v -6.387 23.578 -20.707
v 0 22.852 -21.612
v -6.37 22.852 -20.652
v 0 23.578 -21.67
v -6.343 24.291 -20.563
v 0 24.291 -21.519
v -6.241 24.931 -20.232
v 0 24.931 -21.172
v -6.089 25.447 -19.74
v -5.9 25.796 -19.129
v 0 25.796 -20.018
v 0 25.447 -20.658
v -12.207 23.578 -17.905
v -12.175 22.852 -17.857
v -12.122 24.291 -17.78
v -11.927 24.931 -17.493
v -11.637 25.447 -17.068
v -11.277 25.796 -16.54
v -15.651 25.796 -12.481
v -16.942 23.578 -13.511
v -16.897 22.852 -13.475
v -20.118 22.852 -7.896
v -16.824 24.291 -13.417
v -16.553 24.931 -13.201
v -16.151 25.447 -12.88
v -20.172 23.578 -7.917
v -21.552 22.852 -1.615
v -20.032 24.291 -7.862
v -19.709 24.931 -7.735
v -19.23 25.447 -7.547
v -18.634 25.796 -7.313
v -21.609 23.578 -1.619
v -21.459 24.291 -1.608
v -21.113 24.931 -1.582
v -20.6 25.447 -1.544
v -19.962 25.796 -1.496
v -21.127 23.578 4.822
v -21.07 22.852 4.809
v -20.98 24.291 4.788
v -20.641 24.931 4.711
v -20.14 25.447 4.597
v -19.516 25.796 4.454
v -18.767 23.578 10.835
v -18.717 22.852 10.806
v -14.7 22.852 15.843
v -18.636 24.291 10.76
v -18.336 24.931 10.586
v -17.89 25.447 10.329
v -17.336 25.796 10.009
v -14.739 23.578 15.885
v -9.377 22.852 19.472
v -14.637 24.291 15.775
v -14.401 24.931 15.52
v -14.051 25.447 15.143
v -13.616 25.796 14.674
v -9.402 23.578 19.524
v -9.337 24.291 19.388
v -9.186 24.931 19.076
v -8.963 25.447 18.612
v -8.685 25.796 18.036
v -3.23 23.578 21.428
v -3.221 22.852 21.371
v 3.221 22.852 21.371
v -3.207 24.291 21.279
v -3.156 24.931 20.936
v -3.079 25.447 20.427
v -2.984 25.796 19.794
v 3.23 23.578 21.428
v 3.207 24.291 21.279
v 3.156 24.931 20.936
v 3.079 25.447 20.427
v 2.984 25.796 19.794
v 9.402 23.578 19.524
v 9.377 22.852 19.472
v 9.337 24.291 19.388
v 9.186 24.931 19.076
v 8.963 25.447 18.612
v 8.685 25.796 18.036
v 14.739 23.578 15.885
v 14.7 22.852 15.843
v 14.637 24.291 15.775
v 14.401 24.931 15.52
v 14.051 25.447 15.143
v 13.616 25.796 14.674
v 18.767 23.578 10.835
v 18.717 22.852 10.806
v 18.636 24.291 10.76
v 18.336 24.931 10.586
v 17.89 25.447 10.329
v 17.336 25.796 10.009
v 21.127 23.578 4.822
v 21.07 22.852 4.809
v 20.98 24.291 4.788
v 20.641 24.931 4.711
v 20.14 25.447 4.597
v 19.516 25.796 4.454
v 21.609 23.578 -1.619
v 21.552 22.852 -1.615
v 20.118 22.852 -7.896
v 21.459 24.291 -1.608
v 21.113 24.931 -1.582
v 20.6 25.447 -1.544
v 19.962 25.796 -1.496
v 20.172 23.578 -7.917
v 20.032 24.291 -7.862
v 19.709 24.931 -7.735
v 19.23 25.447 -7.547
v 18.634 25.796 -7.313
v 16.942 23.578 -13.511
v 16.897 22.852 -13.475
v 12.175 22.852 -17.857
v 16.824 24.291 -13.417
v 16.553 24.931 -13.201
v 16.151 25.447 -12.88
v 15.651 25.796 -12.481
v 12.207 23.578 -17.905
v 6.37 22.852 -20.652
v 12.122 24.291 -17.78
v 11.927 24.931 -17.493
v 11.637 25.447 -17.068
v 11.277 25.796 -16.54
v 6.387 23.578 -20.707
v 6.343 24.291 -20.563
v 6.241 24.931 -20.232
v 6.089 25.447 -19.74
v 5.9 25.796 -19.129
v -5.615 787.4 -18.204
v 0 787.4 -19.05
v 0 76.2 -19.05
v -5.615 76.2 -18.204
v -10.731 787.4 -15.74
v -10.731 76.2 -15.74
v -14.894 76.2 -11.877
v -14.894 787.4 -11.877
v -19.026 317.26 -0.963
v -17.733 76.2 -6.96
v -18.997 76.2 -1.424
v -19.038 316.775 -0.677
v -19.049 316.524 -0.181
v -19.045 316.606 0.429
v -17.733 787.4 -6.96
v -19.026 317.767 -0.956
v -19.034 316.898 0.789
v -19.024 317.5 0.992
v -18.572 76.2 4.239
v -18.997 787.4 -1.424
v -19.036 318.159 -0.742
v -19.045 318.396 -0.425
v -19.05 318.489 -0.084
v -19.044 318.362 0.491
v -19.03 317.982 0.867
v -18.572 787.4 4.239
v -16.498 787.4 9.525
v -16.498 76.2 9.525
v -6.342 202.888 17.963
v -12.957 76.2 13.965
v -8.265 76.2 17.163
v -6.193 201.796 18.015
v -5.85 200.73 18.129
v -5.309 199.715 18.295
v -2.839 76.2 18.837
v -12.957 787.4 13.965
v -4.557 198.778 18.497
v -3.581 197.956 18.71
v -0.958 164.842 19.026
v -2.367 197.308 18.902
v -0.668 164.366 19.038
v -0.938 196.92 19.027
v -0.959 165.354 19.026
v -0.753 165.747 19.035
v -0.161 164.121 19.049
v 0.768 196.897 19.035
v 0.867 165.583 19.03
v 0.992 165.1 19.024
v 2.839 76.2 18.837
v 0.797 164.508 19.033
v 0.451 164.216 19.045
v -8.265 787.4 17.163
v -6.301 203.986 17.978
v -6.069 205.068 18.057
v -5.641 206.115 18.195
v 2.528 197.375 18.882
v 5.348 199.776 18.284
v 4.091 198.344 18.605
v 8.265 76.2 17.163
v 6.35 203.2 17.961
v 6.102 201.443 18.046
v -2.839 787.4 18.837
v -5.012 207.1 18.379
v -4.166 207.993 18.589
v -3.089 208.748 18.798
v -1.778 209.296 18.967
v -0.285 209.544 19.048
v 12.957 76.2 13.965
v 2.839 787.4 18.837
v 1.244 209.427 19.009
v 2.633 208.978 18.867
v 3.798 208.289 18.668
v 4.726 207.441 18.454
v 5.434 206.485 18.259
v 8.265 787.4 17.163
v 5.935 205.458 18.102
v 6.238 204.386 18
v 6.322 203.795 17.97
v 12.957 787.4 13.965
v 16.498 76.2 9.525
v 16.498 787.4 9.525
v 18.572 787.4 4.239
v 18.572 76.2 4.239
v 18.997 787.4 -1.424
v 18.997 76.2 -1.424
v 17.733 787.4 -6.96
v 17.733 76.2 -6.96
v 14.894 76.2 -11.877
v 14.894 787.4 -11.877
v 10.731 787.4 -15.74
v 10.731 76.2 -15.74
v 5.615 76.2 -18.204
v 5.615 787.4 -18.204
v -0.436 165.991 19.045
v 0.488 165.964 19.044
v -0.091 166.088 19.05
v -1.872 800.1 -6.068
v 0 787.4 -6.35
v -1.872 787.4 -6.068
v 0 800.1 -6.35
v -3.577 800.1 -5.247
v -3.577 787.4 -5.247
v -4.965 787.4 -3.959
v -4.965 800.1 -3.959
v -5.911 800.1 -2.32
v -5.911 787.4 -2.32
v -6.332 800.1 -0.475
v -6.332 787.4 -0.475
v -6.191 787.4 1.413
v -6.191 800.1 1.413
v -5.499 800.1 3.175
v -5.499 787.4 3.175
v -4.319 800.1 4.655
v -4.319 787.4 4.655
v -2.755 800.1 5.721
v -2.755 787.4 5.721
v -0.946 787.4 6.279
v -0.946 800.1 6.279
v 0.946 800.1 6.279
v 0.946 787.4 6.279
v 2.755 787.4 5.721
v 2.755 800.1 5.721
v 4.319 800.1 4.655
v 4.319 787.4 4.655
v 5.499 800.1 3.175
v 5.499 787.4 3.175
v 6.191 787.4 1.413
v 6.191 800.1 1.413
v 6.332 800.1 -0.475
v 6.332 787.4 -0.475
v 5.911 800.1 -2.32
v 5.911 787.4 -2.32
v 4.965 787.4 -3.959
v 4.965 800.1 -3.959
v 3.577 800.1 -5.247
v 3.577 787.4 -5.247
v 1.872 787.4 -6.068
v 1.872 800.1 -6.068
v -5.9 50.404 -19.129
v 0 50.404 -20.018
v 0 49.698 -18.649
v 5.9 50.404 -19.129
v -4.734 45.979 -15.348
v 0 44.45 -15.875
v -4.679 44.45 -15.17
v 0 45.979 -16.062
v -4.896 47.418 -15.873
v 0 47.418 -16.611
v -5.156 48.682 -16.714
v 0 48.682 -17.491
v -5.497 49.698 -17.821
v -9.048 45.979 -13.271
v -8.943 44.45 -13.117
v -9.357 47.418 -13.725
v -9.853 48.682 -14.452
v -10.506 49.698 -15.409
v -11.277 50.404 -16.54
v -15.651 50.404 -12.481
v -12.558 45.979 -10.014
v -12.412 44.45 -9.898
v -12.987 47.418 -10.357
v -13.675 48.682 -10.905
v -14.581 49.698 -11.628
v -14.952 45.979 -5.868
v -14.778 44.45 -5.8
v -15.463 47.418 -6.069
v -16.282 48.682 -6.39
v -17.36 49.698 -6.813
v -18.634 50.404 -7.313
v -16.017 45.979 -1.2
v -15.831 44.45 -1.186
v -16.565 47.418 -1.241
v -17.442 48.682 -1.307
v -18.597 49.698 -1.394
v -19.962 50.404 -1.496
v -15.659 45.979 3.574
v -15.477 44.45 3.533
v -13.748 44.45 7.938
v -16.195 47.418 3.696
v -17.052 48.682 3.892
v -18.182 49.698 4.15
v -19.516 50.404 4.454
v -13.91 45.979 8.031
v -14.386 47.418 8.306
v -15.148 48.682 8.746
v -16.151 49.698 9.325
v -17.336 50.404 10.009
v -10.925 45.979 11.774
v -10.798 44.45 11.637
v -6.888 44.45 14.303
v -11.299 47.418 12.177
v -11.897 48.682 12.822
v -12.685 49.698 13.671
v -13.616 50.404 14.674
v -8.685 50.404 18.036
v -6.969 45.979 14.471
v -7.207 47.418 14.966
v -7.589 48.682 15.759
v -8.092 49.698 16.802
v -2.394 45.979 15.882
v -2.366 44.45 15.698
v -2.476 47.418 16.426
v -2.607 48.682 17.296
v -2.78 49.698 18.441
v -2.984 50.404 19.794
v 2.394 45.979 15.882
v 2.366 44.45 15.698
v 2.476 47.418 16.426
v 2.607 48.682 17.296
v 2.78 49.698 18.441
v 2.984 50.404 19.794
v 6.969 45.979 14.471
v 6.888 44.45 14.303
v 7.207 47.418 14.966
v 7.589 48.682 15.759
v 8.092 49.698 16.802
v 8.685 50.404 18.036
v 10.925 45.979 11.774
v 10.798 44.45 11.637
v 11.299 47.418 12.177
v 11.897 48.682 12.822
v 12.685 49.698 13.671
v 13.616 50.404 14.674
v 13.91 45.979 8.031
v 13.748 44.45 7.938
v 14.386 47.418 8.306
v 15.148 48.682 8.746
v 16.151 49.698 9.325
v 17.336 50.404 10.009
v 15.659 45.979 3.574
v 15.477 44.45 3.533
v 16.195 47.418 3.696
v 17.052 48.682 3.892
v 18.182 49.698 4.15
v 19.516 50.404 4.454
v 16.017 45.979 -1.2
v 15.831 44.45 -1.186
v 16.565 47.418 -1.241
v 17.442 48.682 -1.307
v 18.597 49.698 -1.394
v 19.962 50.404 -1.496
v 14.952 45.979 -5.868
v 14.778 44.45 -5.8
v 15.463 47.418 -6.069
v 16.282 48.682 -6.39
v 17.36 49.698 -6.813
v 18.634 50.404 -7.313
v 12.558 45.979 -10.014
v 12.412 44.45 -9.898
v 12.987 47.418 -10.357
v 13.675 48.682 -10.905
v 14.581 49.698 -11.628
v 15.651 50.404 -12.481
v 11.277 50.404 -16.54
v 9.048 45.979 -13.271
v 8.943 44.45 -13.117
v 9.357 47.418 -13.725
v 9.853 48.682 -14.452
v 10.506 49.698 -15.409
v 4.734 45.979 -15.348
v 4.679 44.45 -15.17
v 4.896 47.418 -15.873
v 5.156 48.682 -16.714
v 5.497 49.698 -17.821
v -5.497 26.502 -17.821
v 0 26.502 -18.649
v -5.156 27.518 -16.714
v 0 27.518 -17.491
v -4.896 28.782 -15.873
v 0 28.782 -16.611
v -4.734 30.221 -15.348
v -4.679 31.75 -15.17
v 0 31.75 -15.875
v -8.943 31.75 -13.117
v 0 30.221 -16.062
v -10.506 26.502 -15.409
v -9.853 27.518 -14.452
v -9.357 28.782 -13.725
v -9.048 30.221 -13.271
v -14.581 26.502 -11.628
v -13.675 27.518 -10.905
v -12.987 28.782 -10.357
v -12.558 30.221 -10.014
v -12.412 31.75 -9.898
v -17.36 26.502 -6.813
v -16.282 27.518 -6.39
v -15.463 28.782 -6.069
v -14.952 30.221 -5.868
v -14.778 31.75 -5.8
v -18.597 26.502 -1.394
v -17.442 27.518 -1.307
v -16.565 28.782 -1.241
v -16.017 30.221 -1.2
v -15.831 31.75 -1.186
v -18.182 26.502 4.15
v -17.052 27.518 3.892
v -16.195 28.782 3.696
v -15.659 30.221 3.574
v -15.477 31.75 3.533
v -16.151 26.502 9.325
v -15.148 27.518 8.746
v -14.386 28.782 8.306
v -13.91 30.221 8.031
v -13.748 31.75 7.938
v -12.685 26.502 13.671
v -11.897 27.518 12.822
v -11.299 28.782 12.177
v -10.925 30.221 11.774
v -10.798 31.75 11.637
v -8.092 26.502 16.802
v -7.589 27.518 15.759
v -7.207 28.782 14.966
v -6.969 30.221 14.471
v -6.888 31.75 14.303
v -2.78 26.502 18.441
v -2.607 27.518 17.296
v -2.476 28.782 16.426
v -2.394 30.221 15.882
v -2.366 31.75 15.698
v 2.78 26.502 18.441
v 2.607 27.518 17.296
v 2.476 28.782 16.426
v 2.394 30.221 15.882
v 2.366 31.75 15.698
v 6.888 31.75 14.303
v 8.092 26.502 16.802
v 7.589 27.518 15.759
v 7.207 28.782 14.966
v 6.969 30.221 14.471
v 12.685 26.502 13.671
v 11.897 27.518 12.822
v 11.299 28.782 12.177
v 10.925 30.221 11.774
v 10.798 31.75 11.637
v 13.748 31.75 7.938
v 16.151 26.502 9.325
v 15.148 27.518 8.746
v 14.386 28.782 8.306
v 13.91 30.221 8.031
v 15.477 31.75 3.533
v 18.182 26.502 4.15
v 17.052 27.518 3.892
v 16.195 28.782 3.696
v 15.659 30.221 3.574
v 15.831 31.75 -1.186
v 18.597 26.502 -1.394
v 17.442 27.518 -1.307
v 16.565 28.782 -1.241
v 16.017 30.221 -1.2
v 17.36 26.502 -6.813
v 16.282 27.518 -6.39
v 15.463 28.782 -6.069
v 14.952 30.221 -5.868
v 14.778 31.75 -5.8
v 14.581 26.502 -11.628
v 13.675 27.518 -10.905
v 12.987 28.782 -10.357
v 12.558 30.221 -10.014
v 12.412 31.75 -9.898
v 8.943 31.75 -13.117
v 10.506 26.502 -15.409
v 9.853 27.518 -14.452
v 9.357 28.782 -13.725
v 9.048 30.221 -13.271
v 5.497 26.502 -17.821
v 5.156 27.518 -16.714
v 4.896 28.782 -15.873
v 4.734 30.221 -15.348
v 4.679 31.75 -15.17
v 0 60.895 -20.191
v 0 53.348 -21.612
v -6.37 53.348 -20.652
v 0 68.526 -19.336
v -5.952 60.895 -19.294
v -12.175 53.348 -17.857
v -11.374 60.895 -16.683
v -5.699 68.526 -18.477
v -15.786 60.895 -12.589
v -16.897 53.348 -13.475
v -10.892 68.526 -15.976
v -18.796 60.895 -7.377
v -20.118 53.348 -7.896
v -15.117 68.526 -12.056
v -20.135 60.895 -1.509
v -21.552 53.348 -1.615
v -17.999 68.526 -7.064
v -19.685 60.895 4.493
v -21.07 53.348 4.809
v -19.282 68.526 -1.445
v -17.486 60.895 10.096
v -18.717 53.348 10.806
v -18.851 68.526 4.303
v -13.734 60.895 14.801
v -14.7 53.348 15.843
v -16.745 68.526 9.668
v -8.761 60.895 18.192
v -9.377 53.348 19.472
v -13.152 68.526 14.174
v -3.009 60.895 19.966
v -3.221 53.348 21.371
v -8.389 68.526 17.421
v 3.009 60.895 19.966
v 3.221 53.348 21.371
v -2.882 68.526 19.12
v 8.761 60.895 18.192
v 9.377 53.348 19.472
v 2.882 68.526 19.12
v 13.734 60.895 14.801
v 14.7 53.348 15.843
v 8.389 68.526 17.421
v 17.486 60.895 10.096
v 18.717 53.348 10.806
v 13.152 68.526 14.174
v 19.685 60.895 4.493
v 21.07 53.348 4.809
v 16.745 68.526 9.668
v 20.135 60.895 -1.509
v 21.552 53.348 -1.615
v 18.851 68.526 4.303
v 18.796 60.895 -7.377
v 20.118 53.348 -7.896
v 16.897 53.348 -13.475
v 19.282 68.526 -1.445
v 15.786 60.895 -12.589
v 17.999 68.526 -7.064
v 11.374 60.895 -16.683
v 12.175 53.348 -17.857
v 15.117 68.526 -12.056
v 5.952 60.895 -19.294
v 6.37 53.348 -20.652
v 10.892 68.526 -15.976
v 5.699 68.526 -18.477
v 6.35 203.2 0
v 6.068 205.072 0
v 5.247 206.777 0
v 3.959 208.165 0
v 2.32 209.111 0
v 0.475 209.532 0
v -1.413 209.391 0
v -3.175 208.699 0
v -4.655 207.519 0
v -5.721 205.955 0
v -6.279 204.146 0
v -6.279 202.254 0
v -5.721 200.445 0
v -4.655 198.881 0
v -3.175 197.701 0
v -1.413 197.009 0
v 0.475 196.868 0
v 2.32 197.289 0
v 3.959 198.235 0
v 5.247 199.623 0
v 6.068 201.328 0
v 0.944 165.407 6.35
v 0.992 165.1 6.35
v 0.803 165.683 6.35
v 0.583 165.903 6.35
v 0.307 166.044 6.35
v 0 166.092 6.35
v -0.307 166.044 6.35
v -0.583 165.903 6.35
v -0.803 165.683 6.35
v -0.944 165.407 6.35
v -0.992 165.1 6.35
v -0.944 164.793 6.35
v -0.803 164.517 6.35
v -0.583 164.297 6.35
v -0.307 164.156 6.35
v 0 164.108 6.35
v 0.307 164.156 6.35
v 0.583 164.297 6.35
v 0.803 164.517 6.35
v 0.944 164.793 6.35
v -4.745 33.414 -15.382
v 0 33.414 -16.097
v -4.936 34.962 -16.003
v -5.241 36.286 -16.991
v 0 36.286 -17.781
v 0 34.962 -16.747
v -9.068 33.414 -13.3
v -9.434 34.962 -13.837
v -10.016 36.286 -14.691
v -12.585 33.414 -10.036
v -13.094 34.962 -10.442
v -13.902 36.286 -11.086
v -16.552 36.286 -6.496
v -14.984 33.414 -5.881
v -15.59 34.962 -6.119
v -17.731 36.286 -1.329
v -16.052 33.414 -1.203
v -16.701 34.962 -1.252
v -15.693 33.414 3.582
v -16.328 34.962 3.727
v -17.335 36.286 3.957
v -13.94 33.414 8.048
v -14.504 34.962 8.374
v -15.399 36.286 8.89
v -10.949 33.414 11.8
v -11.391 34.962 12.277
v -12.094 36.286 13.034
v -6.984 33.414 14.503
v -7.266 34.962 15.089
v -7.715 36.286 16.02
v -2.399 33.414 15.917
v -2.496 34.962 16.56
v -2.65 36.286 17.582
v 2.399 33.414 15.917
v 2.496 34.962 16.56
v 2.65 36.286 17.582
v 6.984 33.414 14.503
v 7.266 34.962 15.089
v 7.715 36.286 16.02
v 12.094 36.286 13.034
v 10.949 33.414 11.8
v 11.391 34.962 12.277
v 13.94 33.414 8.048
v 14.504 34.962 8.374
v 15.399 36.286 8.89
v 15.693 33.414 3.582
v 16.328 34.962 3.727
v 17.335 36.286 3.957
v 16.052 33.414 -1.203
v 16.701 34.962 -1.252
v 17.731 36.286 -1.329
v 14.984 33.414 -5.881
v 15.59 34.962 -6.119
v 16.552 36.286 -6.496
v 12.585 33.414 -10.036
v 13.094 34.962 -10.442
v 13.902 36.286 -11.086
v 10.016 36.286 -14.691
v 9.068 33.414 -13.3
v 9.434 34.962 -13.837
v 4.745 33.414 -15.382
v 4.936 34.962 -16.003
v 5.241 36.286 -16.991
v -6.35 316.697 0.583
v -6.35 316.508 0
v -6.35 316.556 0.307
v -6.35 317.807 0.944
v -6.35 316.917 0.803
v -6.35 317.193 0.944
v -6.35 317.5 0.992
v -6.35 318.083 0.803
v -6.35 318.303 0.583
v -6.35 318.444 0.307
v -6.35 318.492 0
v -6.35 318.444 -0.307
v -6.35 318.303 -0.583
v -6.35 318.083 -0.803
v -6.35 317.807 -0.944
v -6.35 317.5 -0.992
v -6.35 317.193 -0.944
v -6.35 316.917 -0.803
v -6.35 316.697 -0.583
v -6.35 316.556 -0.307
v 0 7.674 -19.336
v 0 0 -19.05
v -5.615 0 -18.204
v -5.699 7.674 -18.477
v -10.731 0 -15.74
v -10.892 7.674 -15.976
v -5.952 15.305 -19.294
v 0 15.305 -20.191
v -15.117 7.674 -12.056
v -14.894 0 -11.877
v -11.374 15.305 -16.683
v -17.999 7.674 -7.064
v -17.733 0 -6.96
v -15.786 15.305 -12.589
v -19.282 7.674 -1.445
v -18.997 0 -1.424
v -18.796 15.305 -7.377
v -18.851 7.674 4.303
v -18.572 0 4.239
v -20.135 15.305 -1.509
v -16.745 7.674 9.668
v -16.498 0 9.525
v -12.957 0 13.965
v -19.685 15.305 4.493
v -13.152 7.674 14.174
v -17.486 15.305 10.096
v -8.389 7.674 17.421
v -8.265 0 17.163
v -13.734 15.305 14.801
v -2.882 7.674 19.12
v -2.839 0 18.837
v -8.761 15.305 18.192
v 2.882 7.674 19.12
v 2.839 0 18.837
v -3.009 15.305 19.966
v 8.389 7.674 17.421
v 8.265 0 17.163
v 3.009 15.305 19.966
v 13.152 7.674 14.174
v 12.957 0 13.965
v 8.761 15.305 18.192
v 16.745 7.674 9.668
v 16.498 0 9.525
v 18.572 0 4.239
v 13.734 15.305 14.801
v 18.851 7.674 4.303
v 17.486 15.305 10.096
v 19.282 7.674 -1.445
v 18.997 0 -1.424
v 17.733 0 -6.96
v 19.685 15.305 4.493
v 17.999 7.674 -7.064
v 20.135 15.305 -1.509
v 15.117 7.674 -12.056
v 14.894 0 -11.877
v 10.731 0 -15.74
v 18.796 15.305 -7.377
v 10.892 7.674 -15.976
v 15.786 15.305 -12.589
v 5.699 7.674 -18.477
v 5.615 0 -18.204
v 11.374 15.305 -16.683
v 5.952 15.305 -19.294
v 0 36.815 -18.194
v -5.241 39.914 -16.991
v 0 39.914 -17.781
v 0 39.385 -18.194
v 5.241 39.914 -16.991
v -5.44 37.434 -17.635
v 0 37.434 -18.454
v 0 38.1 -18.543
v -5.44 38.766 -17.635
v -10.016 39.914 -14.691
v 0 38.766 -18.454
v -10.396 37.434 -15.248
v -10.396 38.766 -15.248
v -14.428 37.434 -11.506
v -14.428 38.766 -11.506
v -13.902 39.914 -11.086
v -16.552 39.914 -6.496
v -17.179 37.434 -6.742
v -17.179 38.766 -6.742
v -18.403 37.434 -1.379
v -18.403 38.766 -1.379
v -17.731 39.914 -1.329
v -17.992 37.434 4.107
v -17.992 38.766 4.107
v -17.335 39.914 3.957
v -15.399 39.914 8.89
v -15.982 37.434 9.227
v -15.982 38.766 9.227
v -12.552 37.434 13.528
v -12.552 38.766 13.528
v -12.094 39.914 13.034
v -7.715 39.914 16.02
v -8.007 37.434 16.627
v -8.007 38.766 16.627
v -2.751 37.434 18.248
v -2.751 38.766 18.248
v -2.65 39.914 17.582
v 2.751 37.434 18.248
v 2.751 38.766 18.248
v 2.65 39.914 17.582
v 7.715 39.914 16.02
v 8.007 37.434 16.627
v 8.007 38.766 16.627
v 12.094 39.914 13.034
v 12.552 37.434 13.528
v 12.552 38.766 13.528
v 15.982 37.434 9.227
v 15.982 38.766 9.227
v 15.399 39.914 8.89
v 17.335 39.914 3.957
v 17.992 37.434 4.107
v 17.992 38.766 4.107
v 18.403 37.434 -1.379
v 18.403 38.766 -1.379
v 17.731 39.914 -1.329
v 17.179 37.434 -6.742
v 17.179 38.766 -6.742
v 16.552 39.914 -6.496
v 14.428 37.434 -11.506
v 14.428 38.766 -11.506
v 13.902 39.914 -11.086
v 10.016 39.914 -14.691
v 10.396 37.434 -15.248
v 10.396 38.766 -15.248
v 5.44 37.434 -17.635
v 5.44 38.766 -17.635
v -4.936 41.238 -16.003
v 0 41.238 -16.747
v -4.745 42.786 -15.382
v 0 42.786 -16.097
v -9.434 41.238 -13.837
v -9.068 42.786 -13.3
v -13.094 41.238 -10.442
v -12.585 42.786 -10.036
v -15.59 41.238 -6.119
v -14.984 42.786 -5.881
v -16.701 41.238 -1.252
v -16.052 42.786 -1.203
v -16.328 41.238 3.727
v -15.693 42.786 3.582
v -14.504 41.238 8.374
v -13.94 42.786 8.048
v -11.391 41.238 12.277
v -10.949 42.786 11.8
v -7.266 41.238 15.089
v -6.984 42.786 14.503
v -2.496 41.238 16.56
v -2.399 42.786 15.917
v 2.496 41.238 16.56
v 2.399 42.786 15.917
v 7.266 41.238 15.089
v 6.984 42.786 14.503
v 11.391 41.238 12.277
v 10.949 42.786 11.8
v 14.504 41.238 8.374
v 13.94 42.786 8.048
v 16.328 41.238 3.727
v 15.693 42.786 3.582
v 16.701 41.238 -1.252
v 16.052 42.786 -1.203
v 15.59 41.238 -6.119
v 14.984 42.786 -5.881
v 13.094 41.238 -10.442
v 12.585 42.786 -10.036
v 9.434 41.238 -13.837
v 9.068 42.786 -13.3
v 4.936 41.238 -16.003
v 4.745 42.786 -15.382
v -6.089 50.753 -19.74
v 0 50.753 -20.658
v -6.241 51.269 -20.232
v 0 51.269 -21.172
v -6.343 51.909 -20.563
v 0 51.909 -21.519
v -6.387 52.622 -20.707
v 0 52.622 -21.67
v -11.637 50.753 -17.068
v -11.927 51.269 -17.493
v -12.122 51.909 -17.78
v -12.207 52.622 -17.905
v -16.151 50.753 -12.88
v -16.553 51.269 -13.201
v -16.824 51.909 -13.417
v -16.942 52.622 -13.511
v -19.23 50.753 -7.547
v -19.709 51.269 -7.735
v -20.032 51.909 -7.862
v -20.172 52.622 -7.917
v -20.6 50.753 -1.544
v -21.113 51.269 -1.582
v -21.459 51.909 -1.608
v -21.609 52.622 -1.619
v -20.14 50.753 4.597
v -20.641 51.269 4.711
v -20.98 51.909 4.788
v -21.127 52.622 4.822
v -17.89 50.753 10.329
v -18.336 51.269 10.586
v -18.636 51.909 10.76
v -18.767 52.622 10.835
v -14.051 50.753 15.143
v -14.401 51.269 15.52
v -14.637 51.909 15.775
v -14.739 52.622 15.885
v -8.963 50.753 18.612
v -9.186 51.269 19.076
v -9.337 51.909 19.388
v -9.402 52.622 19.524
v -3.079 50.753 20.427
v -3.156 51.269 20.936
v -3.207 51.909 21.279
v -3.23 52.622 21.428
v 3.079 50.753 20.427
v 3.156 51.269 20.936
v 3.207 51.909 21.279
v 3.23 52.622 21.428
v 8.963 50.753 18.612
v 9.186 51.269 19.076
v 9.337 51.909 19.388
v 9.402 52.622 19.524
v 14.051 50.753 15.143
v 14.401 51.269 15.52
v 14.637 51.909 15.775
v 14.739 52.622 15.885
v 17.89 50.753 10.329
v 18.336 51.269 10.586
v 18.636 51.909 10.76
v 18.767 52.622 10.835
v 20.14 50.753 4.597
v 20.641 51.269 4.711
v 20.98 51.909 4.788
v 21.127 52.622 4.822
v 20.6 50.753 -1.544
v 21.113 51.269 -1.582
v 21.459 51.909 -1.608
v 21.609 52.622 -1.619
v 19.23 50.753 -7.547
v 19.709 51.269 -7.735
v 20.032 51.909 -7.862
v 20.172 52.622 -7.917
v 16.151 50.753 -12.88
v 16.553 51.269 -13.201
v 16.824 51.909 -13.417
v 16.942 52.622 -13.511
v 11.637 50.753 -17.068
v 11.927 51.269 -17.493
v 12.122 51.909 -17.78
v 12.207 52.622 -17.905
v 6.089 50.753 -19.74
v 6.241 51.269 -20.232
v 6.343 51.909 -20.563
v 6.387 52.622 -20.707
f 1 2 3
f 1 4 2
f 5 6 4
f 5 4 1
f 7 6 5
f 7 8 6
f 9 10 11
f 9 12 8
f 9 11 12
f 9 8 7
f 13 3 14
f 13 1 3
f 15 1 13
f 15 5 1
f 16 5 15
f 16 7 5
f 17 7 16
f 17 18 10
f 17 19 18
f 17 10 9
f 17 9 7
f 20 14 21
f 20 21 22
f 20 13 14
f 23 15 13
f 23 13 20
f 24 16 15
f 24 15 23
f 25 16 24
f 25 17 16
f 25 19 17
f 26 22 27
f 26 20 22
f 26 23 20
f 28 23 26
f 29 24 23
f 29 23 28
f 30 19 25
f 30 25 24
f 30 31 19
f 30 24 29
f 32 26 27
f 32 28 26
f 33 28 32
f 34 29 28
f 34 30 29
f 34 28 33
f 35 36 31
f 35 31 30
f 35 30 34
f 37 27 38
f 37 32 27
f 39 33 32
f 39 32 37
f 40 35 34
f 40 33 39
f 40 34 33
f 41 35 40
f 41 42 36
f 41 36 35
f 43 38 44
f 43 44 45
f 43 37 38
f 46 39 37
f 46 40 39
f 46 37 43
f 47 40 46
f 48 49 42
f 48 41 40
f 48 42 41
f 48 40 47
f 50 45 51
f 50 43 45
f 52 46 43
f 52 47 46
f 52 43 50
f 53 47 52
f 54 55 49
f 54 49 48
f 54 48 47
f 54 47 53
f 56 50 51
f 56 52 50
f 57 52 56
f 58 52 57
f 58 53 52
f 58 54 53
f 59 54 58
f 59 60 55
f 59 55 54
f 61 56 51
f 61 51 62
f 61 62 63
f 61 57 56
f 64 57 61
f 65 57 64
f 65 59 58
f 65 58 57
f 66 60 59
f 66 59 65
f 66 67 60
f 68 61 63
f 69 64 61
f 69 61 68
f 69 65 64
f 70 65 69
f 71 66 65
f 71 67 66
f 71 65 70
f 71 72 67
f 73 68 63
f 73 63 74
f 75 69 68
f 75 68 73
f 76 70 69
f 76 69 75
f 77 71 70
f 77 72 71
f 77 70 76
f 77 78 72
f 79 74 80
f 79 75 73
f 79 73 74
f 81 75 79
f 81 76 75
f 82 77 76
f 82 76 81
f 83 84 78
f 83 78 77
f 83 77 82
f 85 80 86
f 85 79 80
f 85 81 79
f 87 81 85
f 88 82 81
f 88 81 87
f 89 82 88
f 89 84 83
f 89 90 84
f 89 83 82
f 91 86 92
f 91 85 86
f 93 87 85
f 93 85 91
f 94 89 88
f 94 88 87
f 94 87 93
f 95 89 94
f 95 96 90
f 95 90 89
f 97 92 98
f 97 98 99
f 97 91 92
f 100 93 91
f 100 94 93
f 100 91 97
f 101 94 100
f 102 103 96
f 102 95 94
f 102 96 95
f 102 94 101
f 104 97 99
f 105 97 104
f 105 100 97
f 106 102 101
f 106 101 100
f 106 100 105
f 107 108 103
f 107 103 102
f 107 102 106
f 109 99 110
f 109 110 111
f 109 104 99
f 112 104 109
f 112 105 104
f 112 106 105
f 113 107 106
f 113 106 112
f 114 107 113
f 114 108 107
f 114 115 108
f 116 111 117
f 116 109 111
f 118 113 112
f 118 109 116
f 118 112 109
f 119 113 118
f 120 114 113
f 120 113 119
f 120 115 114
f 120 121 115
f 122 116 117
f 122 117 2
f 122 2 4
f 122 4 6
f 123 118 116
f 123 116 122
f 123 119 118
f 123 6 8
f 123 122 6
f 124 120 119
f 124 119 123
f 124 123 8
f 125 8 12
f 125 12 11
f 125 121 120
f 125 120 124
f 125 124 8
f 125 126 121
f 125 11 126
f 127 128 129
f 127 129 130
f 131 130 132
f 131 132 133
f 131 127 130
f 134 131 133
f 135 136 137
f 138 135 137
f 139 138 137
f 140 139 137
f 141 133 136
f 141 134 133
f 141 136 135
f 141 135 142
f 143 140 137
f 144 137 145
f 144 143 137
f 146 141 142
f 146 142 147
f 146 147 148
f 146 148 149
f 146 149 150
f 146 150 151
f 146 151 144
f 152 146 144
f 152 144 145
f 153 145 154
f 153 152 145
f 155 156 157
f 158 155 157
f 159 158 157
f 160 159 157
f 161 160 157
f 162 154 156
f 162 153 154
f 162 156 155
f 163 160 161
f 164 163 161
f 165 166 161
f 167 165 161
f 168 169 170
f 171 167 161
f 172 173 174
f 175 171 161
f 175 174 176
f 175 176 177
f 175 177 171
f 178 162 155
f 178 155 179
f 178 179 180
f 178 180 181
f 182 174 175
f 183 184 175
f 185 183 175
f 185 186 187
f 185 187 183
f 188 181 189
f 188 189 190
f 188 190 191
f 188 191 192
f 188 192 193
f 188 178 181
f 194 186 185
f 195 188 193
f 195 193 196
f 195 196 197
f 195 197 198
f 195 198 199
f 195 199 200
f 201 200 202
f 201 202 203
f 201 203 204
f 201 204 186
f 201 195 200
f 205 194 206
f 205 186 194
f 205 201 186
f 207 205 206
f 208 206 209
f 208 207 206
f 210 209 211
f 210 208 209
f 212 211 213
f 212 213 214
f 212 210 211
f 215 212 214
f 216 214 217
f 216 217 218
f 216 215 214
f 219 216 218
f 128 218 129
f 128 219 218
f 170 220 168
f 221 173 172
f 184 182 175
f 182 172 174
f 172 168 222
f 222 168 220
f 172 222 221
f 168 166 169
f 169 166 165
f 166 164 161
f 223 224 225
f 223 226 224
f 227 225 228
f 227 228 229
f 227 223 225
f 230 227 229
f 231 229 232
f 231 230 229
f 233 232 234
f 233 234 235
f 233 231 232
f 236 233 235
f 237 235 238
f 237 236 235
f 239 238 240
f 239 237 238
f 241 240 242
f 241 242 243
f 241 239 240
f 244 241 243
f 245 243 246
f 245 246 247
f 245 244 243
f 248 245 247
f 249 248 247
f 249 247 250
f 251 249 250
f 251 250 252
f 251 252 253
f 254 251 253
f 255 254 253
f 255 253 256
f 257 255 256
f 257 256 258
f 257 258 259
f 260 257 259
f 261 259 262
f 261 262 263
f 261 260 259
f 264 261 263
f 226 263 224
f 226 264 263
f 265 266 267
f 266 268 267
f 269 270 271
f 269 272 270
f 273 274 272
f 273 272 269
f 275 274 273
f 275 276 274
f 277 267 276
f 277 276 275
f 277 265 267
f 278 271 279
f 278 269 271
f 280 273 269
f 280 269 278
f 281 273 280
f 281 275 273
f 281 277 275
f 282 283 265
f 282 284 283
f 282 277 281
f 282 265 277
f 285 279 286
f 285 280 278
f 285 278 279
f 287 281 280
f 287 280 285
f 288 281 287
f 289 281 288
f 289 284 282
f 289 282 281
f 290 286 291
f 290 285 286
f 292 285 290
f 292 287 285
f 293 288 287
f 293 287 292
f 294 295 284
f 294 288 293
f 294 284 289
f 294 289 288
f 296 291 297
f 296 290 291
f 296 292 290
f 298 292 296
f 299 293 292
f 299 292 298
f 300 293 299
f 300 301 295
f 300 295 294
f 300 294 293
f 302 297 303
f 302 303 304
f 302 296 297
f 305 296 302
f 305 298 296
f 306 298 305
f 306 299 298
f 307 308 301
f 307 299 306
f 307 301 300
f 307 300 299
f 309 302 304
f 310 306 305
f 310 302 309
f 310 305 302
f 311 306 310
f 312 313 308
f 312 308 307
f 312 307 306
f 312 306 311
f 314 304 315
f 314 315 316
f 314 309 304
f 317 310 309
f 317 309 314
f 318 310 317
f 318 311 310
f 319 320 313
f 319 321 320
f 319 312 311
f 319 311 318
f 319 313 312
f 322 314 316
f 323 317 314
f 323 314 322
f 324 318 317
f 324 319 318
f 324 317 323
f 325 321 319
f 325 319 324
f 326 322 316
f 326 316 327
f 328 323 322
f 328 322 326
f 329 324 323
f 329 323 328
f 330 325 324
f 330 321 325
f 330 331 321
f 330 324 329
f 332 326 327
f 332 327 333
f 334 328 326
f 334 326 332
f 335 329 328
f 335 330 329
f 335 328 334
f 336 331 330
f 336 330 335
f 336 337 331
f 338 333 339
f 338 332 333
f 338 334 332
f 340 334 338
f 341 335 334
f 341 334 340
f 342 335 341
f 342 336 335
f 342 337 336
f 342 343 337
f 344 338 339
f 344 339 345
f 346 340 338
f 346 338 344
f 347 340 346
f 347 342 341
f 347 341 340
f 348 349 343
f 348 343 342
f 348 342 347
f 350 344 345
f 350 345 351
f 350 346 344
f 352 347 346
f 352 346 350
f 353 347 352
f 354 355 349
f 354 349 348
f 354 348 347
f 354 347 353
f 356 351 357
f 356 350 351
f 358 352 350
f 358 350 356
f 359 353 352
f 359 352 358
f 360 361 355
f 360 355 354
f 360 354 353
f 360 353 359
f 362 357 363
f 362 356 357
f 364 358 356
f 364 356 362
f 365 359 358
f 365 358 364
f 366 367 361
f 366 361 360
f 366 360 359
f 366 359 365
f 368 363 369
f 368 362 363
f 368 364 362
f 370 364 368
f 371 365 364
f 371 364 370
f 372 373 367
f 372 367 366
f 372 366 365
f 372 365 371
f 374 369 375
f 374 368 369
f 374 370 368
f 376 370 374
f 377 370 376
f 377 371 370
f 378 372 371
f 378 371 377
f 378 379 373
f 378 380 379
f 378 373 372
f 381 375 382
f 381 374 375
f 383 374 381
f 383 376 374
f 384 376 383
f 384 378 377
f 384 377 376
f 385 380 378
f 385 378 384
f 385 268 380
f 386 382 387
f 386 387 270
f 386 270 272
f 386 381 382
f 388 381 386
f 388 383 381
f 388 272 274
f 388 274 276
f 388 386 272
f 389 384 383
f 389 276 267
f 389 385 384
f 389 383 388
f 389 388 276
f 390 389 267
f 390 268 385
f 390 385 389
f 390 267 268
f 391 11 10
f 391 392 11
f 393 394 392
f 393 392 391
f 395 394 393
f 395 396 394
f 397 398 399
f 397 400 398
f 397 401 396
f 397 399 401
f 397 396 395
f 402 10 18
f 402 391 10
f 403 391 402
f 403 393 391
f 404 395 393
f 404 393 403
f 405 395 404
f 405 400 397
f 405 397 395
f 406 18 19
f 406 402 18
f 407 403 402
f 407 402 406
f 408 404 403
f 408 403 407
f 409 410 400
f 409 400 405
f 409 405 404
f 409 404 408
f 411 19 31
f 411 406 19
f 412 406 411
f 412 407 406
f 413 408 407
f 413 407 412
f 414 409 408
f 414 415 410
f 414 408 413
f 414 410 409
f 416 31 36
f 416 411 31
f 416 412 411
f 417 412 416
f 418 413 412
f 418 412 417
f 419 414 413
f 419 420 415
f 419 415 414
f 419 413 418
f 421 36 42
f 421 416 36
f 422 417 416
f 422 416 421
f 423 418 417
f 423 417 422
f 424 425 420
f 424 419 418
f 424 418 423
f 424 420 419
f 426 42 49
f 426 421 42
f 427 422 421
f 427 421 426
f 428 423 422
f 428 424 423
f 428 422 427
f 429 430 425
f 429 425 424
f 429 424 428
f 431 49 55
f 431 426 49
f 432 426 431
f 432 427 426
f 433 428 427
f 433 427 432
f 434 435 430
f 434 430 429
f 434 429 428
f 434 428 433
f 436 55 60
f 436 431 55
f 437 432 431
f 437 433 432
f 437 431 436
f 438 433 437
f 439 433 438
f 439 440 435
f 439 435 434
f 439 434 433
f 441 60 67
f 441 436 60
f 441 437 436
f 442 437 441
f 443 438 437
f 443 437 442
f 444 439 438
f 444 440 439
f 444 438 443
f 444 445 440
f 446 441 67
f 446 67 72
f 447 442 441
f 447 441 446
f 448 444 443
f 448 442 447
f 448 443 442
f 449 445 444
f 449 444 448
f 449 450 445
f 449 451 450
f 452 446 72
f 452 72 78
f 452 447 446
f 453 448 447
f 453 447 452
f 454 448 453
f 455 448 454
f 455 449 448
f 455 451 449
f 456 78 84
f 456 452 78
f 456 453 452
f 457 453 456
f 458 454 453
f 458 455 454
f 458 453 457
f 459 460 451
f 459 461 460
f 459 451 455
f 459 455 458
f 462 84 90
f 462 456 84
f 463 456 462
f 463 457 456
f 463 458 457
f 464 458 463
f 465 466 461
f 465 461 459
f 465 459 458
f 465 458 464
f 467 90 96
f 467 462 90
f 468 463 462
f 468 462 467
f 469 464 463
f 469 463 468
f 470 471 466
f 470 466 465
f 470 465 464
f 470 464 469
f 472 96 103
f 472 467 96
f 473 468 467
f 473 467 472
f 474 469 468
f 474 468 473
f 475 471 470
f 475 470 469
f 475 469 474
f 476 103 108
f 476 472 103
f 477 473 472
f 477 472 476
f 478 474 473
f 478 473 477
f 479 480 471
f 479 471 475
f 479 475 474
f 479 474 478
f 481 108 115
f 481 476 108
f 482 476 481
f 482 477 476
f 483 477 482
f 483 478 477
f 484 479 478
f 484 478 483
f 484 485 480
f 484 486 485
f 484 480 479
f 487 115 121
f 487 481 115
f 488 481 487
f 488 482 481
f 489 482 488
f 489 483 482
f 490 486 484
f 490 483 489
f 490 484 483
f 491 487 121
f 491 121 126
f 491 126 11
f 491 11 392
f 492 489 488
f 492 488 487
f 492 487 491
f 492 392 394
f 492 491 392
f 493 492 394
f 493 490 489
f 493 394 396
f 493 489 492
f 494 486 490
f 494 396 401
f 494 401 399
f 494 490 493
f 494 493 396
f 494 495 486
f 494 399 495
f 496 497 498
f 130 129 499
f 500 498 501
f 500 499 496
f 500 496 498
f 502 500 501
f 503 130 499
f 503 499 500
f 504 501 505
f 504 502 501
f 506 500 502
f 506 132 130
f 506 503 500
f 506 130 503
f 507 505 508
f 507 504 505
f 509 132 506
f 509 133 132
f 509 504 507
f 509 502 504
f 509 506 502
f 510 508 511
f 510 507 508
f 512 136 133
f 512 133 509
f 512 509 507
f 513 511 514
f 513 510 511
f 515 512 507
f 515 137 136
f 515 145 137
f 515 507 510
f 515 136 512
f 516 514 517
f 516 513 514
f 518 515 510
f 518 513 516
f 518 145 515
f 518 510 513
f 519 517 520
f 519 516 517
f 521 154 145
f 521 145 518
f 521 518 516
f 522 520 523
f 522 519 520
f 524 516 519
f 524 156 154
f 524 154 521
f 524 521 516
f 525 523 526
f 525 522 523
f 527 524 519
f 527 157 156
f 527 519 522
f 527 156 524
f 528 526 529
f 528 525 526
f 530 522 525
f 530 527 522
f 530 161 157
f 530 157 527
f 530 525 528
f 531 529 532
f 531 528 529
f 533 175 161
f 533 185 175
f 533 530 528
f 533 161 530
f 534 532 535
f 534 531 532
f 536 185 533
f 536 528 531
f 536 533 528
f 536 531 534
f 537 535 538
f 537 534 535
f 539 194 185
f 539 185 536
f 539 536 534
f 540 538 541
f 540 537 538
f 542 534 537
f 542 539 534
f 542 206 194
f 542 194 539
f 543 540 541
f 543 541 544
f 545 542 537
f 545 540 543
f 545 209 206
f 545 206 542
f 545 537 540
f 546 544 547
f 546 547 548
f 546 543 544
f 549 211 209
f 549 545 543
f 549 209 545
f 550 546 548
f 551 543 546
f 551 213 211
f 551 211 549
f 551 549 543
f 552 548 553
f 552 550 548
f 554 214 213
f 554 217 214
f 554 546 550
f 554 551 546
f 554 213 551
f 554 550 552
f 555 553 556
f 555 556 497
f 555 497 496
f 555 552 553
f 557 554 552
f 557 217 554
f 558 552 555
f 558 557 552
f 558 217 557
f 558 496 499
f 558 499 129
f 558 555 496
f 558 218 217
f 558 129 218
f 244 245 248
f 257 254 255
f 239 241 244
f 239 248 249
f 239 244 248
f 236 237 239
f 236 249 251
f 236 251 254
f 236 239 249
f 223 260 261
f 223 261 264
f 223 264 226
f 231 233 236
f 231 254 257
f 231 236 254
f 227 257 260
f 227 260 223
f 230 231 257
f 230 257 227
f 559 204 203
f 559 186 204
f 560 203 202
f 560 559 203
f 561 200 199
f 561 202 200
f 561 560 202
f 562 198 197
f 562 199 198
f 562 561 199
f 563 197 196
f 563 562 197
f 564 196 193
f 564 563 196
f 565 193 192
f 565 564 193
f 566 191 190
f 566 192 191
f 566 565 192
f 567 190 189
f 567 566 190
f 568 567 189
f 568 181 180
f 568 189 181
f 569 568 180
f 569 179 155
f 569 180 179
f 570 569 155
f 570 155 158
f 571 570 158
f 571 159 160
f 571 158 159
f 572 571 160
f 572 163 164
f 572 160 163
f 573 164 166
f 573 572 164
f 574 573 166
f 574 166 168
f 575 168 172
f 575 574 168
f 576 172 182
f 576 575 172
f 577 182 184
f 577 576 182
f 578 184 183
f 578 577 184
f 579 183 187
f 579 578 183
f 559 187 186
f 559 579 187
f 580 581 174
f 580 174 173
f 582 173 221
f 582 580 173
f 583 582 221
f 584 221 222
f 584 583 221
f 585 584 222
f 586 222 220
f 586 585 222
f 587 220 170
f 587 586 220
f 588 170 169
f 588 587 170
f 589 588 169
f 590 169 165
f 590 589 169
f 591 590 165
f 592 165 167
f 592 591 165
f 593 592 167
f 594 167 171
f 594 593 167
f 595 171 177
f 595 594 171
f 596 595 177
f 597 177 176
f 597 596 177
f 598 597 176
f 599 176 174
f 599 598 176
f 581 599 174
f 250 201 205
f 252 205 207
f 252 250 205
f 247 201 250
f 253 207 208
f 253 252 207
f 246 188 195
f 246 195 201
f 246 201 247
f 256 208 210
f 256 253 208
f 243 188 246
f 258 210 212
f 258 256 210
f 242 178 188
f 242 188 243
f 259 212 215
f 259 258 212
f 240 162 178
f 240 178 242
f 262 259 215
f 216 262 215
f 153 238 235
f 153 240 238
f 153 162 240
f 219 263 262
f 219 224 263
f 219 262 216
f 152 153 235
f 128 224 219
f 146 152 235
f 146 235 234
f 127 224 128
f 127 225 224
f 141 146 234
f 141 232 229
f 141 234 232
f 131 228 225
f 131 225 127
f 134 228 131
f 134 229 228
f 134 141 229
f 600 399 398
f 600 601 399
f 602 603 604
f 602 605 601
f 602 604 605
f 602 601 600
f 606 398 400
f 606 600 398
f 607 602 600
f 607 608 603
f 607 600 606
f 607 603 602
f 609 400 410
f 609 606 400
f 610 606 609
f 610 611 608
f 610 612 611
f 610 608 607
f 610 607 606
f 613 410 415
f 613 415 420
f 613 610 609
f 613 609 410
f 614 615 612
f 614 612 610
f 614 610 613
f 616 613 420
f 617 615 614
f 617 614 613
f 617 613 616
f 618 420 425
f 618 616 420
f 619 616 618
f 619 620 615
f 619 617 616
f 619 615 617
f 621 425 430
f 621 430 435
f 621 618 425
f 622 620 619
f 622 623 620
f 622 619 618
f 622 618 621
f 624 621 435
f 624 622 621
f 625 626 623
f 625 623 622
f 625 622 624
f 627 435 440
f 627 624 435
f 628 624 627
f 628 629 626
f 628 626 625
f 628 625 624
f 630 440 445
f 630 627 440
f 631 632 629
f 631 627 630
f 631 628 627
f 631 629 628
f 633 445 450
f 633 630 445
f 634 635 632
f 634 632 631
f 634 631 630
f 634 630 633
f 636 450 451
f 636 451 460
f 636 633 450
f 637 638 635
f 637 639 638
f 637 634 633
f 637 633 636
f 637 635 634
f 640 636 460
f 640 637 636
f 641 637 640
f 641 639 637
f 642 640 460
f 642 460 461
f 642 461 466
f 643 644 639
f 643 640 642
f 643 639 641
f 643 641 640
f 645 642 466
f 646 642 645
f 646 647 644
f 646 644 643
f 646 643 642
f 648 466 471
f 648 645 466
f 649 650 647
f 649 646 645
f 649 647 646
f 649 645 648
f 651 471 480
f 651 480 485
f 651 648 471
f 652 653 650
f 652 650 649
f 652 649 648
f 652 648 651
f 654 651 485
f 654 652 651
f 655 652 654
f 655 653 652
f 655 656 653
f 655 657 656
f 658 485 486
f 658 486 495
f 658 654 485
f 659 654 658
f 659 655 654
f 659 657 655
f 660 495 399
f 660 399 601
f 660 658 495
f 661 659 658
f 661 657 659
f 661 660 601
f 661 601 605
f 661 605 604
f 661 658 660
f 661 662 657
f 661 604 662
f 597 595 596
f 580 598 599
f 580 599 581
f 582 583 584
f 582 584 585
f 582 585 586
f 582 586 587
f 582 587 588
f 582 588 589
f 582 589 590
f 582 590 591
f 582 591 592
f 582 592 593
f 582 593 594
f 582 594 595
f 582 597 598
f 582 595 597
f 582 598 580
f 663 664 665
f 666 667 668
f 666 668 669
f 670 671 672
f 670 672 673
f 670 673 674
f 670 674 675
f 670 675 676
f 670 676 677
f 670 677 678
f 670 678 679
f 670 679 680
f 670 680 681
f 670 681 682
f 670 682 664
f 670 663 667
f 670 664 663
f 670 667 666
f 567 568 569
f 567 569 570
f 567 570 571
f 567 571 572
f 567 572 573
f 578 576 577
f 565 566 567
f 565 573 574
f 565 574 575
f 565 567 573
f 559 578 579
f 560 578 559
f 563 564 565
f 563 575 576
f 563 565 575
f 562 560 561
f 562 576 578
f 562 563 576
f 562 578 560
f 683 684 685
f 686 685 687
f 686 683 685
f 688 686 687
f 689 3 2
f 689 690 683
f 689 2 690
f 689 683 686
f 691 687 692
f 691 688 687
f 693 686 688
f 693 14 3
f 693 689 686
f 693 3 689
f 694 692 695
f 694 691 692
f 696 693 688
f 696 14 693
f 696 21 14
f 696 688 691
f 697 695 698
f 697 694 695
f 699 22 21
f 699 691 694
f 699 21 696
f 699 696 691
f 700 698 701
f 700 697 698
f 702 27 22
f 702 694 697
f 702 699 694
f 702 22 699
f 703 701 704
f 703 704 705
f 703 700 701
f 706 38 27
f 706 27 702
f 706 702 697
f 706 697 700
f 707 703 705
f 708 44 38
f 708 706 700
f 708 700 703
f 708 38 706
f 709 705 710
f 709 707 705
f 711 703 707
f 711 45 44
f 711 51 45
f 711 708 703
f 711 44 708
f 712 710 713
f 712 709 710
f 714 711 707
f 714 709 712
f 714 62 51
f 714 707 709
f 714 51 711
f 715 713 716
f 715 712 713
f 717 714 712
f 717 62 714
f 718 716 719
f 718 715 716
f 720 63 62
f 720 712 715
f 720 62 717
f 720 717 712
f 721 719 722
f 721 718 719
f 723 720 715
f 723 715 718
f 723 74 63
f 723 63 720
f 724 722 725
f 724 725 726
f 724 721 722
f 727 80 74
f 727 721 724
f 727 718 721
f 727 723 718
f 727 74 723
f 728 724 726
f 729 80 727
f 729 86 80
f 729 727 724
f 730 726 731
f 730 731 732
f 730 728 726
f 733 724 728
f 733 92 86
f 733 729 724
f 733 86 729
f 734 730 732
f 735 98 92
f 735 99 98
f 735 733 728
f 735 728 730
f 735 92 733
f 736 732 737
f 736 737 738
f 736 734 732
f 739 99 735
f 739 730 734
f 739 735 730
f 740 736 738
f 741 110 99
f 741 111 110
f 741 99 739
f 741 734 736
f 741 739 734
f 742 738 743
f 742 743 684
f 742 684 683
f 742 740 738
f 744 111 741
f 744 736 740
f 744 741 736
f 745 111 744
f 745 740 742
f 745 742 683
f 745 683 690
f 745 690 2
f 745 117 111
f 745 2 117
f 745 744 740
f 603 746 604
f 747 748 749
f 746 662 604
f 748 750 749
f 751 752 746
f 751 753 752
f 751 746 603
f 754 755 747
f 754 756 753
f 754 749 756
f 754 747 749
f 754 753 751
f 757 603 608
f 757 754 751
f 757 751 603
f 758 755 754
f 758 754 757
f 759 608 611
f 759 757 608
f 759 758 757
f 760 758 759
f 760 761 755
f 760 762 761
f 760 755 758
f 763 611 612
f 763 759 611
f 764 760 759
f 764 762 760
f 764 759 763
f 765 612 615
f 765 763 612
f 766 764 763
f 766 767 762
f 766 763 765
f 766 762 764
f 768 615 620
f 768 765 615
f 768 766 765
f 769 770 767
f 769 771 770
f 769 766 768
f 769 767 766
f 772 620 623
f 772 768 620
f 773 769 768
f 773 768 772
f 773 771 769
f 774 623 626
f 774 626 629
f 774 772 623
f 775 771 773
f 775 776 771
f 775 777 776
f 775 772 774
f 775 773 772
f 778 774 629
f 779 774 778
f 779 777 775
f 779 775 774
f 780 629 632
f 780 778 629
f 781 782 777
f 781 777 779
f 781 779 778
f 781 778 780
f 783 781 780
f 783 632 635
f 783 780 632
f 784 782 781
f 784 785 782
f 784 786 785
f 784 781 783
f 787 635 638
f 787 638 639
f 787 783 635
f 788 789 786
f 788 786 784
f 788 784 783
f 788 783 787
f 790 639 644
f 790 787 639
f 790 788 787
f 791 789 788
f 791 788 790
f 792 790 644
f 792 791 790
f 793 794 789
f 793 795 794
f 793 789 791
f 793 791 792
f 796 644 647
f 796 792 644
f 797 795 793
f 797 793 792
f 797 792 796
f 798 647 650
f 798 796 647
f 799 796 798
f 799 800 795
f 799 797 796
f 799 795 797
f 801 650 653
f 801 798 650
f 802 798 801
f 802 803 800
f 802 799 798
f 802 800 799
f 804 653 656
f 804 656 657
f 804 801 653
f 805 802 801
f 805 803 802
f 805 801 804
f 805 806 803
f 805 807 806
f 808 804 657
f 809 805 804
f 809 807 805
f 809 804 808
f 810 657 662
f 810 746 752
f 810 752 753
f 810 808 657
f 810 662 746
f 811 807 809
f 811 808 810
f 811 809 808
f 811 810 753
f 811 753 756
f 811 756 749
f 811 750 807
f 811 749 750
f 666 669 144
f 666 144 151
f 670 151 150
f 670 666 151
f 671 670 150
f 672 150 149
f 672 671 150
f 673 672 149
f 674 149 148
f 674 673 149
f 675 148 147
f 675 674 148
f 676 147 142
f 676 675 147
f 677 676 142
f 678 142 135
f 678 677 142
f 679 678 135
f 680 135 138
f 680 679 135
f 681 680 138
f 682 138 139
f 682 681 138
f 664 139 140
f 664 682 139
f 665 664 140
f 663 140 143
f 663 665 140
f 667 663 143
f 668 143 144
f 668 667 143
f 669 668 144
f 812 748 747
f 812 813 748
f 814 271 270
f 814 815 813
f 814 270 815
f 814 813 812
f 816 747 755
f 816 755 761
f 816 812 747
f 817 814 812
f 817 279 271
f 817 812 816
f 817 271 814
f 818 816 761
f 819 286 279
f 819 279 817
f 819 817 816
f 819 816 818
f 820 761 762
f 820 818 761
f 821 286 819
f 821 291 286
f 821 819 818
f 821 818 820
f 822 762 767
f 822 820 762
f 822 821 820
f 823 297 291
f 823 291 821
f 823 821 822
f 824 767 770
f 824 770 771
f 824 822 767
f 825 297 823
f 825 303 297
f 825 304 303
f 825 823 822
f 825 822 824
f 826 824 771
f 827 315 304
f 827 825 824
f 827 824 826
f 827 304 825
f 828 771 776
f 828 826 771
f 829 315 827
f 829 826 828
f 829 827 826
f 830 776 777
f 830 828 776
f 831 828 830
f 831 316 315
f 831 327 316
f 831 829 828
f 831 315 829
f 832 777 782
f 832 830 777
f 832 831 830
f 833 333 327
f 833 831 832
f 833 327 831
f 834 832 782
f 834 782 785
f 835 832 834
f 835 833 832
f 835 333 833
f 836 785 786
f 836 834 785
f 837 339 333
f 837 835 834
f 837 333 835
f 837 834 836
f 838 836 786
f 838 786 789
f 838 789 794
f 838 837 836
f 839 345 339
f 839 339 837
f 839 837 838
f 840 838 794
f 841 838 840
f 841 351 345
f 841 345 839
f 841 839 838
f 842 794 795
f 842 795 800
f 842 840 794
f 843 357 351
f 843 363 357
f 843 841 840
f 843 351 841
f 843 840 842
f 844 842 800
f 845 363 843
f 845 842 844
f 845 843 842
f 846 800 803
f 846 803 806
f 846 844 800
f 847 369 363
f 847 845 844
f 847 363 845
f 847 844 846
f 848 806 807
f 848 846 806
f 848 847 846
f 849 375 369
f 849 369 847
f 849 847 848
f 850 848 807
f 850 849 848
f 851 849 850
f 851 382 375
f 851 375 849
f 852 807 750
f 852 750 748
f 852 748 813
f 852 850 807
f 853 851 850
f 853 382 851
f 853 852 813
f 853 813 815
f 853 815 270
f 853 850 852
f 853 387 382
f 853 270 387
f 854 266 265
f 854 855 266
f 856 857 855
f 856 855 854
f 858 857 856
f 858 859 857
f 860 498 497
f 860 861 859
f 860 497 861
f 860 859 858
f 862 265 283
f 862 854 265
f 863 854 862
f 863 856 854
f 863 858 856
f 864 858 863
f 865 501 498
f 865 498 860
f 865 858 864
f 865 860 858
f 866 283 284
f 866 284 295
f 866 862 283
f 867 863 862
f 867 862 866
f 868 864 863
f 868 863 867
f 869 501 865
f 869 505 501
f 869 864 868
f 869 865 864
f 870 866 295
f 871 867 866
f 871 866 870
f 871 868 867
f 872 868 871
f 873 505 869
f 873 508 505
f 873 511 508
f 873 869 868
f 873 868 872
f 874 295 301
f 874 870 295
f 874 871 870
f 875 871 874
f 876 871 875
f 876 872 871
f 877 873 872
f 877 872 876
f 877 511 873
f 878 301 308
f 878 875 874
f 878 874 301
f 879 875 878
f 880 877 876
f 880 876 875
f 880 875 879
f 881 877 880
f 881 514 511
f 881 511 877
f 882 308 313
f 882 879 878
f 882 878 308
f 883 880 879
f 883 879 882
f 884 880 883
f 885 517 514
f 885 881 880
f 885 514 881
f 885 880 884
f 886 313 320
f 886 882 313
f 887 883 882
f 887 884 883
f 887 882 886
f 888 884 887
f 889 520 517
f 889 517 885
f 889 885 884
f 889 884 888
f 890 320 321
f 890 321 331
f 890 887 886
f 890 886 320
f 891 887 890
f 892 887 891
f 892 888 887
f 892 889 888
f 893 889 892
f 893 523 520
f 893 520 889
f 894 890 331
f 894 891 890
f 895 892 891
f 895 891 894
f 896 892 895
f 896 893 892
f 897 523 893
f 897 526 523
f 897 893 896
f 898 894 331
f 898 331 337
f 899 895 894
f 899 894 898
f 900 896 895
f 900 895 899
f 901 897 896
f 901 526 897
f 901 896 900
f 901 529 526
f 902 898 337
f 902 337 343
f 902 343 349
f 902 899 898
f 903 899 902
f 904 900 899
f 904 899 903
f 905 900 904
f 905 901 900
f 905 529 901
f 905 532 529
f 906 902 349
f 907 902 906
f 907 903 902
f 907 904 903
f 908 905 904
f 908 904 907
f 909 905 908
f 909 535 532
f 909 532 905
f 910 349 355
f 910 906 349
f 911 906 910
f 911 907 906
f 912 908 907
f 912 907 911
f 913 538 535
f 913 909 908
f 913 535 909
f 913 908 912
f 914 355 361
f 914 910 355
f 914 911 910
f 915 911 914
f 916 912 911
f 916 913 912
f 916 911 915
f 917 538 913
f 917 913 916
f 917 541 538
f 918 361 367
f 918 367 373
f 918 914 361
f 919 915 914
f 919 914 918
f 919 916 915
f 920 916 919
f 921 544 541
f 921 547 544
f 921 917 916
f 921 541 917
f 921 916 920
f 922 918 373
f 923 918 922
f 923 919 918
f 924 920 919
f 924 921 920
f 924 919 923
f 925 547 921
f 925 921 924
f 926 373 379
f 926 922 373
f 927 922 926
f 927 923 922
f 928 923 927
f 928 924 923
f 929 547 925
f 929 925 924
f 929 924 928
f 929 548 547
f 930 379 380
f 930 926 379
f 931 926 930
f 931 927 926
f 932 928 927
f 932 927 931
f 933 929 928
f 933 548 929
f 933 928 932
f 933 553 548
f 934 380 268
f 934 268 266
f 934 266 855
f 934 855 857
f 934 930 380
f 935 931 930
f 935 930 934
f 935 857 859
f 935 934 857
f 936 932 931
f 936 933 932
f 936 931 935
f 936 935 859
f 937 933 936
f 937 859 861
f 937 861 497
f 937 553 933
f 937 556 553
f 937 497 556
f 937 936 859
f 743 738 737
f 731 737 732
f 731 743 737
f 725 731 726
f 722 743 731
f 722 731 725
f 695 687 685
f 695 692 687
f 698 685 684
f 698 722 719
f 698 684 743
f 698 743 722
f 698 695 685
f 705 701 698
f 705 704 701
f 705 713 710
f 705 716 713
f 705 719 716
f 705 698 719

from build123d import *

# Parameters (mm, degrees)
CUT_EXTRUDE3_START = -19.05
SKETCH17_R         = 6.35
CUT_EXTRUDE3_DEPTH = 19.05
CUT_EXTRUDE4_START = -12.7
SKETCH18_R         = 0.9921875
CUT_EXTRUDE4_DEPTH = 12.7
CUT_EXTRUDE5_START = -12.7
SKETCH19_R         = 0.9921875
CUT_EXTRUDE5_DEPTH = 12.7


with BuildPart() as part:
    # revolve sketch → Revolve1 (revolve)
    with BuildSketch(Plane.XY, mode=Mode.PRIVATE) as revolve1_sk:
        with BuildLine():
            Line((0, 0), (19.05, 0))
            ThreePointArc((19.05, 0), (19.692539758, 11.497446902), (21.612156952, 22.851706562))
            ThreePointArc((21.612156952, 22.851706562), (21.368821871, 24.623609523), (20.018018165, 25.795864363))
            ThreePointArc((20.018018165, 25.795864363), (17.012666806, 28.123144244), (15.875, 31.75))
            ThreePointArc((15.875, 31.75), (16.370840305, 34.209941923), (17.780925752, 36.285714286))
            ThreePointArc((17.780925752, 36.285714286), (18.543296053, 38.1), (17.780925752, 39.914285714))
            ThreePointArc((17.780925752, 39.914285714), (16.370840305, 41.990058077), (15.875, 44.45))
            ThreePointArc((15.875, 44.45), (17.012666806, 48.076855756), (20.018018165, 50.404135637))
            ThreePointArc((20.018018165, 50.404135637), (21.368821871, 51.576390477), (21.612156952, 53.348293438))
            ThreePointArc((21.612156952, 53.348293438), (19.692539758, 64.702553098), (19.05, 76.2))
            Line((19.05, 76.2), (19.05, 787.4))
            Line((19.05, 787.4), (6.35, 787.4))
            Line((6.35, 787.4), (6.35, 800.1))
            Line((6.35, 800.1), (0, 800.1))
            Line((0, 800.1), (0, 0))
        make_face()
    revolve(revolve1_sk.sketch.rotate(Axis((0, -55, 0), (0, 1, 0)), 90), axis=Axis((0, -55, 0), (0, 1, 0)))

    # Sketch17 → Cut-Extrude3 (cut)
    with BuildSketch(Plane.XY.offset(19.05).offset(CUT_EXTRUDE3_START)):
        with Locations((0, 203.2)):
            Circle(SKETCH17_R)
    extrude(amount=CUT_EXTRUDE3_DEPTH, mode=Mode.SUBTRACT)

    # Sketch18 → Cut-Extrude4 (cut)
    with BuildSketch(Plane.XY.offset(19.05).offset(CUT_EXTRUDE4_START)):
        with Locations((0, 165.1)):
            Circle(SKETCH18_R)
    extrude(amount=CUT_EXTRUDE4_DEPTH, mode=Mode.SUBTRACT)

    # Sketch19 → Cut-Extrude5 (cut)
    with BuildSketch(Plane.ZY.offset(19.05).offset(CUT_EXTRUDE5_START)):
        with Locations((0, 317.5)):
            Circle(SKETCH19_R)
    extrude(amount=CUT_EXTRUDE5_DEPTH, mode=Mode.SUBTRACT)


solid = part.part
